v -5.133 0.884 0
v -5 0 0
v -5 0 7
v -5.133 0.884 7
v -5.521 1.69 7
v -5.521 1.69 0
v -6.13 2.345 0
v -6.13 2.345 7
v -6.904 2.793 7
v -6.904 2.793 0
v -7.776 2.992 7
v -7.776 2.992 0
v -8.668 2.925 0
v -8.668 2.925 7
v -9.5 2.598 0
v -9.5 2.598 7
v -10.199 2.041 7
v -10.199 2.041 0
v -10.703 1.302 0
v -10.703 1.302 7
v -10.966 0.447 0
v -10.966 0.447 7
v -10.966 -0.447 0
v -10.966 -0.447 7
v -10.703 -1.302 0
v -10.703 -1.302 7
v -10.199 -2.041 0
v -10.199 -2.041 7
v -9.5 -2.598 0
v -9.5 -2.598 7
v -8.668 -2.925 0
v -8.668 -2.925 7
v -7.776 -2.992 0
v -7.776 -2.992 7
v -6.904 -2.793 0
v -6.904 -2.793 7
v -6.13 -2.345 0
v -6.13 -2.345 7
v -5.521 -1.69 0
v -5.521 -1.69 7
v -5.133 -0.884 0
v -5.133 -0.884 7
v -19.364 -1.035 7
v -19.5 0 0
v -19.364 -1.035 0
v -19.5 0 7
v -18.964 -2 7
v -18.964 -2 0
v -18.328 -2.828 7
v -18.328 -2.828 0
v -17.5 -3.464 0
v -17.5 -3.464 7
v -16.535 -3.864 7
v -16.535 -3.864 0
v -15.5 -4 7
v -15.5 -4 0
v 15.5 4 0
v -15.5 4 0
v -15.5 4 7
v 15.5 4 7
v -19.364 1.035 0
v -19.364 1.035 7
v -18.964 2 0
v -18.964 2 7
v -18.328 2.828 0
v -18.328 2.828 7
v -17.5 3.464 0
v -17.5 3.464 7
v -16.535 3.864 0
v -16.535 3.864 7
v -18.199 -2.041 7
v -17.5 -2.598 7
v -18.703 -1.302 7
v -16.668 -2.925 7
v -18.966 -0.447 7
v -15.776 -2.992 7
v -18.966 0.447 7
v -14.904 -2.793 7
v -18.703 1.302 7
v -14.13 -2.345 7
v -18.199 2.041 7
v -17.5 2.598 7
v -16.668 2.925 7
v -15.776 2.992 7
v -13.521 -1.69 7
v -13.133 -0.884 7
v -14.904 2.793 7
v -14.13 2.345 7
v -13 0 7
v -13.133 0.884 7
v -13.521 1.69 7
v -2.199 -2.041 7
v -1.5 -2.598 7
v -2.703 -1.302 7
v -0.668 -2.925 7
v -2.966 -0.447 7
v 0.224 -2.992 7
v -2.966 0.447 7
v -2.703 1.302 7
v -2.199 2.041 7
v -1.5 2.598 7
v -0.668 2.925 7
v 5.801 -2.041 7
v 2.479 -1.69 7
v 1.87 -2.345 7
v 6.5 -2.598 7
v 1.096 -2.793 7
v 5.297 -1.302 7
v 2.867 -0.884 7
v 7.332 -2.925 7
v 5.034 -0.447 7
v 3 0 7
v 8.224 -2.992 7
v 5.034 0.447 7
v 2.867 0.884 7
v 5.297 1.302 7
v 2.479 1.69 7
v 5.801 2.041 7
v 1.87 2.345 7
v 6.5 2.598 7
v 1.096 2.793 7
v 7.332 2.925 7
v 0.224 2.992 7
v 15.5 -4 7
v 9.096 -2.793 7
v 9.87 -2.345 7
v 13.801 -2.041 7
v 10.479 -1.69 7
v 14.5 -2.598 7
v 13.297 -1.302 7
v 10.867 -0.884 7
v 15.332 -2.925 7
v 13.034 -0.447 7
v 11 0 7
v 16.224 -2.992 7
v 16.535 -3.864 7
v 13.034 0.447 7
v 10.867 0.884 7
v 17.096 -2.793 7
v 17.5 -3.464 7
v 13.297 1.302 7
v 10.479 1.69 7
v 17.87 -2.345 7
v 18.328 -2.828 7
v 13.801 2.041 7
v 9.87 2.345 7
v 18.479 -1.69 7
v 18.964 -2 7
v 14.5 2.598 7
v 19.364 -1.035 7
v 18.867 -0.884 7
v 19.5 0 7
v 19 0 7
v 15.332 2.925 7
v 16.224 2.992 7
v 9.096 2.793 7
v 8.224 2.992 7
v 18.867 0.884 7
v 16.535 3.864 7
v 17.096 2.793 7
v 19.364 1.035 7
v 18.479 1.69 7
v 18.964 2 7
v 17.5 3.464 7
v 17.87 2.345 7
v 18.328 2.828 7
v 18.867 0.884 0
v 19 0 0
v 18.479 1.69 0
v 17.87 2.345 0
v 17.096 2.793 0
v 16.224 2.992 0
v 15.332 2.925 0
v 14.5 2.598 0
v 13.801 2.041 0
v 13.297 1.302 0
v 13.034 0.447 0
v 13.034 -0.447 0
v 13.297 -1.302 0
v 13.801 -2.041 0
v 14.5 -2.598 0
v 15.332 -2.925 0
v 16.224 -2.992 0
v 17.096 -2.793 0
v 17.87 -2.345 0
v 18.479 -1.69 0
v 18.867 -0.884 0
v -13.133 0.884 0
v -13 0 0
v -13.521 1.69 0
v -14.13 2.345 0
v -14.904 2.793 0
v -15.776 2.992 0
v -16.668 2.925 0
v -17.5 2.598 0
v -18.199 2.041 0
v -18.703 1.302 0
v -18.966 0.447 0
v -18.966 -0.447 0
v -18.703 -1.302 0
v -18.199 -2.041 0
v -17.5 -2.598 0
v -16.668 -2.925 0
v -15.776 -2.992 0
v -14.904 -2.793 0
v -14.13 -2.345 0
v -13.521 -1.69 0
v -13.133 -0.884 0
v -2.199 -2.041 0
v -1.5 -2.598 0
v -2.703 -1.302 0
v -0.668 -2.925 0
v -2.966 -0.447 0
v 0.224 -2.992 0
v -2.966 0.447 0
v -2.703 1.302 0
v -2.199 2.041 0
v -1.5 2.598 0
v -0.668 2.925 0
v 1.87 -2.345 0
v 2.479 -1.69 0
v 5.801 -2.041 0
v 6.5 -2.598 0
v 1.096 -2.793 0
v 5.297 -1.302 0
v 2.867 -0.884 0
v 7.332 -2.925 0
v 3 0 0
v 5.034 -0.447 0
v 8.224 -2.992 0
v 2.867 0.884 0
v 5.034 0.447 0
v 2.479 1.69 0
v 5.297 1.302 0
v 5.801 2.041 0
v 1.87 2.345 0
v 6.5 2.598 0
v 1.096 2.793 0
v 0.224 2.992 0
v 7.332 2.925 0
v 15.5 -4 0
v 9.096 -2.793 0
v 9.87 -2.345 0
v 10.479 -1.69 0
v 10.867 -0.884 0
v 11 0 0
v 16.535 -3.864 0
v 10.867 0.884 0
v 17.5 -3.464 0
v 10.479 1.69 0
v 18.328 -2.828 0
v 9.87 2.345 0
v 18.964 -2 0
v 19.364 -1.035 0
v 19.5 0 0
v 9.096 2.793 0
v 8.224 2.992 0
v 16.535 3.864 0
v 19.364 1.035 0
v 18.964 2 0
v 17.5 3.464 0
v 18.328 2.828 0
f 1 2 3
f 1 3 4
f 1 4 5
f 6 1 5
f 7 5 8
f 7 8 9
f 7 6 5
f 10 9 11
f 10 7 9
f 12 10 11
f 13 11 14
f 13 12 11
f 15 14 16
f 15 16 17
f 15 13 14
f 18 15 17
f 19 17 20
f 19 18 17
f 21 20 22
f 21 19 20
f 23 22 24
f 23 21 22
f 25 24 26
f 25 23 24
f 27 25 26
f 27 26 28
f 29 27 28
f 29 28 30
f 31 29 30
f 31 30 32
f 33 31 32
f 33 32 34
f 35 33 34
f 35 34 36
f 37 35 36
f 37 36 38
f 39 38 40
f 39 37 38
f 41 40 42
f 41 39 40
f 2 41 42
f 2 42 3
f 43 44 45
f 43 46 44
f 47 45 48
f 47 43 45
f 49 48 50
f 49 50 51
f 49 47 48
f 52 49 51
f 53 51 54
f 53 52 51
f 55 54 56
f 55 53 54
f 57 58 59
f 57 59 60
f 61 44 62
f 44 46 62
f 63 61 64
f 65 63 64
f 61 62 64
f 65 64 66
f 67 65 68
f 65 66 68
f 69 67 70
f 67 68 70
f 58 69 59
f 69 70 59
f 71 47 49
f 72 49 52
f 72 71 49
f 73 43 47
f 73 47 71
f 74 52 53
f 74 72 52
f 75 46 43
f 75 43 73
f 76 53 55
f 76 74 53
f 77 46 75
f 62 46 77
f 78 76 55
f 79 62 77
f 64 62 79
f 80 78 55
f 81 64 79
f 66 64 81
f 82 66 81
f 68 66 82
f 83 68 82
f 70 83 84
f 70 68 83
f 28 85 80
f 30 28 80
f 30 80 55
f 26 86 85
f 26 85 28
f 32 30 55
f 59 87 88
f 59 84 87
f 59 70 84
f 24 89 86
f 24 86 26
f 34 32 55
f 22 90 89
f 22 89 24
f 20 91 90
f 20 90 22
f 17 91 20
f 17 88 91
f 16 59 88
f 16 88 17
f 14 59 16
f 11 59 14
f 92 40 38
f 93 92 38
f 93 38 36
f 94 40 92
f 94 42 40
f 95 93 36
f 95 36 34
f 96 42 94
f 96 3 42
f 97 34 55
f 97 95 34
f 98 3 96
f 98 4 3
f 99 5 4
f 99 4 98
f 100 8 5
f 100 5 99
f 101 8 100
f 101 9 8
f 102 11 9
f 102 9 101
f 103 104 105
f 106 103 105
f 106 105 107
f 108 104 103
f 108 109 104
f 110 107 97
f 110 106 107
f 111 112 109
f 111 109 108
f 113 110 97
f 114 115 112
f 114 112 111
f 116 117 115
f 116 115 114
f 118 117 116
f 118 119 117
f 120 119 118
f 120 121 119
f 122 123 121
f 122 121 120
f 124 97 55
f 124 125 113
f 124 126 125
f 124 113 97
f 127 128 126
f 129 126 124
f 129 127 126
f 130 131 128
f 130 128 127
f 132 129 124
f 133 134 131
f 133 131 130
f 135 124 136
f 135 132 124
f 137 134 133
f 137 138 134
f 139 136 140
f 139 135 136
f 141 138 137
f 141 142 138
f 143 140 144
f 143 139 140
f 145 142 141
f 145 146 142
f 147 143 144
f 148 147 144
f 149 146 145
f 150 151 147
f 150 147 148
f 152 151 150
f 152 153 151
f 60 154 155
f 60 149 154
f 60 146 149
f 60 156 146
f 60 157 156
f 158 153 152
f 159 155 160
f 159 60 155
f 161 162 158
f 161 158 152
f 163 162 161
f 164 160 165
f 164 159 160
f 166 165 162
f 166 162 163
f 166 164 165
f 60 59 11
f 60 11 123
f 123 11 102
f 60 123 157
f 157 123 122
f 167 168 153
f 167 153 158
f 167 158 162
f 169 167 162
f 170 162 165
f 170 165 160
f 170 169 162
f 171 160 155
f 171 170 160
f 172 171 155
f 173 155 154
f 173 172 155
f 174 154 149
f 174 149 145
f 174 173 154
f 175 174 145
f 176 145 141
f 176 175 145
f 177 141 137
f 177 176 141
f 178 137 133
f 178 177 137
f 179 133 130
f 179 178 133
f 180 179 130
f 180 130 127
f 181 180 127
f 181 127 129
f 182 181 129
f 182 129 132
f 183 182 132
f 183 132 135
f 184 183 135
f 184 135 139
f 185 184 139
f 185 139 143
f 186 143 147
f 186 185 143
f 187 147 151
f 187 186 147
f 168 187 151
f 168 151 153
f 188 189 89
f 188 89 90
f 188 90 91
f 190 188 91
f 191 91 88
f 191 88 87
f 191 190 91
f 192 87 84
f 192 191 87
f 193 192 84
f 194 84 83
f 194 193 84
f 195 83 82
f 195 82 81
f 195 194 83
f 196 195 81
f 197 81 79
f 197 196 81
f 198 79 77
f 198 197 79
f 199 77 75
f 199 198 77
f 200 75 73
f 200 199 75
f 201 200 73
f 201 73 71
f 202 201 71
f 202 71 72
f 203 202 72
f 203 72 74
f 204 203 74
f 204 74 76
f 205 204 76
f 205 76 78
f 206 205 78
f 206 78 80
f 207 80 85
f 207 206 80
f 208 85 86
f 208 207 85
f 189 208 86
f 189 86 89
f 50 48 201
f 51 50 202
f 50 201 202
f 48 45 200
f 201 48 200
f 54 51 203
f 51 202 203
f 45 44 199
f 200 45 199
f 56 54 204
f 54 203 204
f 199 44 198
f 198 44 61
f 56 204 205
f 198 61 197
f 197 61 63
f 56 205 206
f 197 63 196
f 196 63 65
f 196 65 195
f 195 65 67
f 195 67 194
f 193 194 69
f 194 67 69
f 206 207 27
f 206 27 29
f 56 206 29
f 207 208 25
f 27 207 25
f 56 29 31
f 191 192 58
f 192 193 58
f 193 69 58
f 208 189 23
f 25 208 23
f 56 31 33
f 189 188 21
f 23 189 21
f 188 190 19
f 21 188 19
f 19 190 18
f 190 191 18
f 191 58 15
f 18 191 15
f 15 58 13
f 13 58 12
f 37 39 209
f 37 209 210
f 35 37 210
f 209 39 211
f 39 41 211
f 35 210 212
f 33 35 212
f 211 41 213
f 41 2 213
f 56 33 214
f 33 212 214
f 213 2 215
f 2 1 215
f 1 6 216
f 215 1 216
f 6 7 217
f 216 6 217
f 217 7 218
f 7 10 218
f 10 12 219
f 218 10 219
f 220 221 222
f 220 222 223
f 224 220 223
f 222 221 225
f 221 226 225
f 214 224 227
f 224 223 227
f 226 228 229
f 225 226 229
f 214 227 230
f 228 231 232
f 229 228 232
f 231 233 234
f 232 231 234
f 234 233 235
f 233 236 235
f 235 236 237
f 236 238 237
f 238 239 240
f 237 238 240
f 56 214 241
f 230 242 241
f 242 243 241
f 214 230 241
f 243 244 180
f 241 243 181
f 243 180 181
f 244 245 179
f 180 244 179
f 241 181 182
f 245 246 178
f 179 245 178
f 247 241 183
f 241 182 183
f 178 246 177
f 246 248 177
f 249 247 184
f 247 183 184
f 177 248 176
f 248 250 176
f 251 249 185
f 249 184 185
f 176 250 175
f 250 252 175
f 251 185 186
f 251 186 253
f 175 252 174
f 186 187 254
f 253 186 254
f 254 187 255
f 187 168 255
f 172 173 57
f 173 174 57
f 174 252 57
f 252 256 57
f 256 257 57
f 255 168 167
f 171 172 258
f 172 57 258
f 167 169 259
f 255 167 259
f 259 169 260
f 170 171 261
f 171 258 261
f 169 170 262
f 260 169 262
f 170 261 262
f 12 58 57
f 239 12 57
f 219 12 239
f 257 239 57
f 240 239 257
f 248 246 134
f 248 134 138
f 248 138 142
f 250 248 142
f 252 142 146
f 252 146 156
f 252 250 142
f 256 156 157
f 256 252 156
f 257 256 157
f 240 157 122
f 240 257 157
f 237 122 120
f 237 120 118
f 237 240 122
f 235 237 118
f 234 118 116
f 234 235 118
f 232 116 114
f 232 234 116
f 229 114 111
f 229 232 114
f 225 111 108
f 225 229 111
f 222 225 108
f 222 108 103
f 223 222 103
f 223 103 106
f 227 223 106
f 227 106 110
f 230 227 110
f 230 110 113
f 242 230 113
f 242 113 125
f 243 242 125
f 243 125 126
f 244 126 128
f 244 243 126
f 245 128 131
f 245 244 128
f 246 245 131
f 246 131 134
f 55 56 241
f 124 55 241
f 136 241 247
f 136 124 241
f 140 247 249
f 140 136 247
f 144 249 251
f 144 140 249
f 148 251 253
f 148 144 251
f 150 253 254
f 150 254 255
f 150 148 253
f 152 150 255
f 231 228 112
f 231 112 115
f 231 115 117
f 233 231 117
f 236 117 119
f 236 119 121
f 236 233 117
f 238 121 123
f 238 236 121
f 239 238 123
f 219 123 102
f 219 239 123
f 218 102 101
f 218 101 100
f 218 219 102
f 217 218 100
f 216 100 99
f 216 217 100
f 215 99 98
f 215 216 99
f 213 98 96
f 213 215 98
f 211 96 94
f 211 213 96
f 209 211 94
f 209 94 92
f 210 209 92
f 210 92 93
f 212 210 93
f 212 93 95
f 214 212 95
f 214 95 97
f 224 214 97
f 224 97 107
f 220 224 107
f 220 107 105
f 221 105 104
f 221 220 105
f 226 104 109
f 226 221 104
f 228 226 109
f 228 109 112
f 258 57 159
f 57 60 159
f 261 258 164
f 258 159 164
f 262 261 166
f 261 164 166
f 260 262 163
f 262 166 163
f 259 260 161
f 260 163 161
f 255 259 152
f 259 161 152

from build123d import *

# Parameters (mm, degrees)
F0_W     = 39
F0_H     = 8
F0_R     = 3
F1_DEPTH = 7
F2_R     = 3.99999


# Not quite as in the source:
# - a fillet or chamfer is up to 0.001 mm smaller than in the source, because OpenCascade refuses the exact size


with BuildPart() as f1:
    # F0 (on Top) → F1 (new body)
    with BuildSketch(Plane.XY):
        Rectangle(F0_W, F0_H)
        with Locations((-16, 0)):
            Circle(F0_R, mode=Mode.SUBTRACT)
        with Locations((-8, 0)):
            Circle(F0_R, mode=Mode.SUBTRACT)
        Circle(F0_R, mode=Mode.SUBTRACT)
        with Locations((8, 0)):
            Circle(F0_R, mode=Mode.SUBTRACT)
        with Locations((16, 0)):
            Circle(F0_R, mode=Mode.SUBTRACT)
    extrude(amount=F1_DEPTH)

    # F2 (radius 4 in the source; OpenCascade refuses exactly that, so slightly less here)
    f2_edges = [f1.edges().sort_by_distance(p)[0] for p in [
        (-19.5, 4, 3.5),
        (-19.5, -4, 3.5),
        (19.5, -4, 3.5),
        (19.5, 4, 3.5),
    ]]
    fillet(f2_edges, radius=F2_R)


solid = f1.part
